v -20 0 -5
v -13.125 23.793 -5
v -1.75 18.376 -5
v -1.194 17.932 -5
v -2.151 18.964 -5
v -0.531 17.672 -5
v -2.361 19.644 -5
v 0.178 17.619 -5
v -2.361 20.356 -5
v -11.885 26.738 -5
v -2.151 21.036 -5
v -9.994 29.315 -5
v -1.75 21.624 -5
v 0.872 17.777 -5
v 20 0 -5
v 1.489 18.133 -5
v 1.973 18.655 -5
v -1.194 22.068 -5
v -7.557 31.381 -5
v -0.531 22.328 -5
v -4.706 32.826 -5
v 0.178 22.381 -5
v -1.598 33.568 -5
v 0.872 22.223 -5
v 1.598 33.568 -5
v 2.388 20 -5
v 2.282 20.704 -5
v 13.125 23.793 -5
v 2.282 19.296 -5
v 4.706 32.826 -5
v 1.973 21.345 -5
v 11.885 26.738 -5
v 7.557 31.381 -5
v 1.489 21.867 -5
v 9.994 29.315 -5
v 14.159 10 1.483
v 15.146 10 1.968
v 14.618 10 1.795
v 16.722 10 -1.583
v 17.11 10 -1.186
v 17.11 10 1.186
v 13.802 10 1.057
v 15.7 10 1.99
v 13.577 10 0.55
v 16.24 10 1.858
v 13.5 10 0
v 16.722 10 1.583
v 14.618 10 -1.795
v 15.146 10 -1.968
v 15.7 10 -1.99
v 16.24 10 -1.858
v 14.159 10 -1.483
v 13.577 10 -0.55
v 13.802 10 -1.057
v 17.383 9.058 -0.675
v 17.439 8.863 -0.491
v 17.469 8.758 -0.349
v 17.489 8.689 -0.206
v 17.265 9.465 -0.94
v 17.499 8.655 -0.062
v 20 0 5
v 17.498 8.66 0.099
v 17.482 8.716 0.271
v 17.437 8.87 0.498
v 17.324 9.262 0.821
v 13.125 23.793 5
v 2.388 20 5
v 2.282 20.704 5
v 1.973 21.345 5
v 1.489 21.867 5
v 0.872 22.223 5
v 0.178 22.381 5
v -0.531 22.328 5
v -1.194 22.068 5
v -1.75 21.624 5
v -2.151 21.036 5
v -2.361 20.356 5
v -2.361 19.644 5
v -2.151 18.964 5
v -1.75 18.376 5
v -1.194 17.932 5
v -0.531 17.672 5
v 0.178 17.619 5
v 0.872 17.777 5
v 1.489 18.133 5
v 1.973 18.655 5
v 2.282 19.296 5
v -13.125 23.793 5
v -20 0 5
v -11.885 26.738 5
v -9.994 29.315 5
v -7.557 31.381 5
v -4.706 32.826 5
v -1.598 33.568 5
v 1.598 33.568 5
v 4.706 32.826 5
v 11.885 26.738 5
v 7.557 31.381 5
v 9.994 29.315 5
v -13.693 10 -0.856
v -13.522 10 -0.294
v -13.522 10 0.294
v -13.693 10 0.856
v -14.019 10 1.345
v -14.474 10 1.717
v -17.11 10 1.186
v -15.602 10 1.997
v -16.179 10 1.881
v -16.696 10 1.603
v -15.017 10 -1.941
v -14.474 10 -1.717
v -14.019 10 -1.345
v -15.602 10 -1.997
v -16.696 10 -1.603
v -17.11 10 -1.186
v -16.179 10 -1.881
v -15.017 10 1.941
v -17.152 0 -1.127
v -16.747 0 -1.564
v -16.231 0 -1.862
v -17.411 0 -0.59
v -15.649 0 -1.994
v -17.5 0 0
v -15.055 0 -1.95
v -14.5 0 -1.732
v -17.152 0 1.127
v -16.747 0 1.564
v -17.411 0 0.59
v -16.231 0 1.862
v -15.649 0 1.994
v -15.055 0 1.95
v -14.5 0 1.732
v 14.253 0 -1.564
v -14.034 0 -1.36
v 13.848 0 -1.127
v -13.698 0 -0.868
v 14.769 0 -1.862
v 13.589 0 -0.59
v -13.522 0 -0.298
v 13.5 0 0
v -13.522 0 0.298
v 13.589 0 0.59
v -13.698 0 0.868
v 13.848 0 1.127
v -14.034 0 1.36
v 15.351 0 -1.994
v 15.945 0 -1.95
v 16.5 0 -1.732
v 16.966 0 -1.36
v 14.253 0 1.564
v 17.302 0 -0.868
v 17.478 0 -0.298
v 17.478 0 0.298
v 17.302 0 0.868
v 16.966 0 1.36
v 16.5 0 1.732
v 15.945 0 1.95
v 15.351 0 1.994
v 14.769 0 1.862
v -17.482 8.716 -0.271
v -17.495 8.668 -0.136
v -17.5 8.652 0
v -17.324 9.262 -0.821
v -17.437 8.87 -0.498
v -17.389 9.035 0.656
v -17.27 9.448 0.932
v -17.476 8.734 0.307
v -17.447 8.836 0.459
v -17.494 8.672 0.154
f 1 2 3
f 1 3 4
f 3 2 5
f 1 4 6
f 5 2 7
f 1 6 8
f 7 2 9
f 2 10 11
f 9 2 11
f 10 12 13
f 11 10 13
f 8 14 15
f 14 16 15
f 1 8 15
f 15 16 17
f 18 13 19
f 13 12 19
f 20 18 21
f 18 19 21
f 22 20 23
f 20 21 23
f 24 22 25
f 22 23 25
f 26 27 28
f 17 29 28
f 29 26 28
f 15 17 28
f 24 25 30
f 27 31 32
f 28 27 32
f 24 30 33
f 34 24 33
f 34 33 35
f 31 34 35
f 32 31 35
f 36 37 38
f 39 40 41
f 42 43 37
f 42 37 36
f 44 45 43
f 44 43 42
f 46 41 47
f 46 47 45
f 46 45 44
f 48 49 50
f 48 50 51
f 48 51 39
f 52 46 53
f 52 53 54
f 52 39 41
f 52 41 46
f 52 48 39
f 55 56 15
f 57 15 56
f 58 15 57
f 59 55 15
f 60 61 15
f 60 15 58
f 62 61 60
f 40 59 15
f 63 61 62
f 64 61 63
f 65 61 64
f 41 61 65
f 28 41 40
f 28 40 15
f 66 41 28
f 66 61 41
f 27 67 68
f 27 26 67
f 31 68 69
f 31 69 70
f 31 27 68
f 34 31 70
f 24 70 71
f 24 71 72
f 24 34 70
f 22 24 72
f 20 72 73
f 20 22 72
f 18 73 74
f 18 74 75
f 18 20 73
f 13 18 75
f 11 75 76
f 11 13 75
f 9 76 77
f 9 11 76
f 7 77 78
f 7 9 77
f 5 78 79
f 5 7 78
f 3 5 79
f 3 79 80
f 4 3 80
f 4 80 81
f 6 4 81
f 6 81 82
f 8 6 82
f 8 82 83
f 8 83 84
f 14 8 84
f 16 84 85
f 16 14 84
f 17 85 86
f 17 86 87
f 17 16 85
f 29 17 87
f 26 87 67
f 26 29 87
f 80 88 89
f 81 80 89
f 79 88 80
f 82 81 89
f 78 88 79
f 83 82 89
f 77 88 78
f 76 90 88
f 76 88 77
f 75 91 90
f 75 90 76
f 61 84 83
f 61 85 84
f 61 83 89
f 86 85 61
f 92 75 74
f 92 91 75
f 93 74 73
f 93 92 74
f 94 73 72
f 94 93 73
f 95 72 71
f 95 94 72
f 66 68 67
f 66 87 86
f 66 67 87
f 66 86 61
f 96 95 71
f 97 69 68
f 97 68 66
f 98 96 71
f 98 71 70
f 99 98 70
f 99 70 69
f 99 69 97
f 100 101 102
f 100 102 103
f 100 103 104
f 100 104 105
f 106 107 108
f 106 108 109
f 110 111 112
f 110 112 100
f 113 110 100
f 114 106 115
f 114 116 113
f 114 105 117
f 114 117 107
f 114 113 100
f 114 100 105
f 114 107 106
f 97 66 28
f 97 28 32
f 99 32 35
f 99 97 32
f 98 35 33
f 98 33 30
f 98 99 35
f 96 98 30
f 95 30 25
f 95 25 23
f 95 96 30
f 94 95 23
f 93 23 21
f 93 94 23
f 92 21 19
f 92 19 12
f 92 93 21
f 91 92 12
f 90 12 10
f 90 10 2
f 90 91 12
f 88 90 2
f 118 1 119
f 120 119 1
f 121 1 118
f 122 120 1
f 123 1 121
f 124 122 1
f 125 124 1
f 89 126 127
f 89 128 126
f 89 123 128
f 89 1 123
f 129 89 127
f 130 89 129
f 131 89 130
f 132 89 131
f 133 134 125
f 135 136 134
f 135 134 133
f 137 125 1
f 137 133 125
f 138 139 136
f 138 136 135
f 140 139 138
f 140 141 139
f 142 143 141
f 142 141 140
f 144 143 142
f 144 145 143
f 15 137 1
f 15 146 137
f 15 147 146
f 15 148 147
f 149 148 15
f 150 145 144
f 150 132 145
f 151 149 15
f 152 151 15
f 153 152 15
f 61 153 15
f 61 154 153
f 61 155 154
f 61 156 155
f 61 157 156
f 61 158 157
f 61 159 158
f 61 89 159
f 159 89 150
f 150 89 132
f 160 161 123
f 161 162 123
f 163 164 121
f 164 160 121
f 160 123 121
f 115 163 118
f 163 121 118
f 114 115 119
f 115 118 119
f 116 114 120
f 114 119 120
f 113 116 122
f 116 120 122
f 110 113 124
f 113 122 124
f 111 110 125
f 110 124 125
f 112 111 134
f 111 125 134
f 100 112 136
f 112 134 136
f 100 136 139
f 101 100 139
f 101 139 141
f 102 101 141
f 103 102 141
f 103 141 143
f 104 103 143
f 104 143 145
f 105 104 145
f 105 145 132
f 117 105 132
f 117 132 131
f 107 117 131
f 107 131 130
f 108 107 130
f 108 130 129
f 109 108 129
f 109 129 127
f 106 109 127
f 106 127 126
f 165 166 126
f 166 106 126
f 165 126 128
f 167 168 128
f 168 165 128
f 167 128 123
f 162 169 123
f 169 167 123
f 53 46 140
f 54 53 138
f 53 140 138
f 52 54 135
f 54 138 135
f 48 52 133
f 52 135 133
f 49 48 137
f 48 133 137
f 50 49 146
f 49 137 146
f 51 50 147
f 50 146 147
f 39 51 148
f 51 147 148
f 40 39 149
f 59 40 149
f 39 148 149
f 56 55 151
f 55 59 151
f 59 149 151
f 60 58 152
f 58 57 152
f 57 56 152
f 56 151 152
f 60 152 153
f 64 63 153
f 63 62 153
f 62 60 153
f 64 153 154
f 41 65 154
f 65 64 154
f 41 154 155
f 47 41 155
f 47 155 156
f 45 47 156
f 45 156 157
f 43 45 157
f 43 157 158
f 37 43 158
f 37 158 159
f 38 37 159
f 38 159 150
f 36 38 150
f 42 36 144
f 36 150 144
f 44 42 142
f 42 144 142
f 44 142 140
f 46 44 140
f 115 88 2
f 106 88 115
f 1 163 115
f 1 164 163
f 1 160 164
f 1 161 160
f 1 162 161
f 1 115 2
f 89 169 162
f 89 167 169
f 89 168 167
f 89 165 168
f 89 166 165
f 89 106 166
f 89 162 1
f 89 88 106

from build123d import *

# Parameters (mm, degrees)
SKETCH2_R           = 2.3876
BOSS_EXTRUDE1_DEPTH = 5
SKETCH3_R           = 2
CUT_EXTRUDE1_DEPTH  = 10


with BuildPart() as part:
    # Sketch2 → Boss-Extrude1 (new body, symmetric)
    with BuildSketch(Plane.XY):
        with BuildLine():
            Line((-20, 0), (20, 0))
            Line((20, 0), (13.124848139, 23.792582213))
            ThreePointArc((13.124848139, 23.792582213), (0, 33.661819737), (-13.124848139, 23.792582213))
            Line((-13.124848139, 23.792582213), (-20, 0))
        make_face()
        with Locations((0, 20)):
            Circle(SKETCH2_R, mode=Mode.SUBTRACT)
    extrude(amount=BOSS_EXTRUDE1_DEPTH, both=True)

    # Sketch3 → Cut-Extrude1 (cut)
    with BuildSketch(Plane(origin=(0, 0, 0), x_dir=(-1, 0, 0), z_dir=(0, -1, 0))):
        with Locations((15.5, 0)):
            Circle(SKETCH3_R)
        with Locations((-15.5, 0)):
            Circle(SKETCH3_R)
    extrude(amount=-CUT_EXTRUDE1_DEPTH, mode=Mode.SUBTRACT)


solid = part.part
